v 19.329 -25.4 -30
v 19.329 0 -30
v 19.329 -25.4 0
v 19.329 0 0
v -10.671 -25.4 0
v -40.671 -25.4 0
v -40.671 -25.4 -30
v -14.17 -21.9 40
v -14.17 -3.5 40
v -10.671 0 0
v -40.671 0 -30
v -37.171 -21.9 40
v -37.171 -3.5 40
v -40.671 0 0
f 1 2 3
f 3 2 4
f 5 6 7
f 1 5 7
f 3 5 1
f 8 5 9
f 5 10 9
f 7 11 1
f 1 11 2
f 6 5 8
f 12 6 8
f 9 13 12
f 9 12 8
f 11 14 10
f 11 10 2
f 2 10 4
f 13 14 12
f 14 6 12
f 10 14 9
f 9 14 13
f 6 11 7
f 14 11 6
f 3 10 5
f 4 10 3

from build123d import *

# Parameters (mm, degrees)
F0_W     = 60
F0_H     = 30
F1_DEPTH = 25.4
F2_W     = 30
F2_H     = 25.4
F3_DEPTH = 40
F3_TAPER = 5


with BuildPart() as f1:
    # F0 (on Front) → F1 (new body)
    with BuildSketch(Plane.XZ):
        with Locations((-10.6705549789, -15)):
            Rectangle(F0_W, F0_H)
    extrude(amount=F1_DEPTH)

    # F2 (on face) → F3 (join)
    with BuildSketch(Plane.XY):
        with Locations((-25.6705549789, -12.7)):
            Rectangle(F2_W, F2_H)
    extrude(amount=F3_DEPTH, taper=F3_TAPER)


solid = f1.part
